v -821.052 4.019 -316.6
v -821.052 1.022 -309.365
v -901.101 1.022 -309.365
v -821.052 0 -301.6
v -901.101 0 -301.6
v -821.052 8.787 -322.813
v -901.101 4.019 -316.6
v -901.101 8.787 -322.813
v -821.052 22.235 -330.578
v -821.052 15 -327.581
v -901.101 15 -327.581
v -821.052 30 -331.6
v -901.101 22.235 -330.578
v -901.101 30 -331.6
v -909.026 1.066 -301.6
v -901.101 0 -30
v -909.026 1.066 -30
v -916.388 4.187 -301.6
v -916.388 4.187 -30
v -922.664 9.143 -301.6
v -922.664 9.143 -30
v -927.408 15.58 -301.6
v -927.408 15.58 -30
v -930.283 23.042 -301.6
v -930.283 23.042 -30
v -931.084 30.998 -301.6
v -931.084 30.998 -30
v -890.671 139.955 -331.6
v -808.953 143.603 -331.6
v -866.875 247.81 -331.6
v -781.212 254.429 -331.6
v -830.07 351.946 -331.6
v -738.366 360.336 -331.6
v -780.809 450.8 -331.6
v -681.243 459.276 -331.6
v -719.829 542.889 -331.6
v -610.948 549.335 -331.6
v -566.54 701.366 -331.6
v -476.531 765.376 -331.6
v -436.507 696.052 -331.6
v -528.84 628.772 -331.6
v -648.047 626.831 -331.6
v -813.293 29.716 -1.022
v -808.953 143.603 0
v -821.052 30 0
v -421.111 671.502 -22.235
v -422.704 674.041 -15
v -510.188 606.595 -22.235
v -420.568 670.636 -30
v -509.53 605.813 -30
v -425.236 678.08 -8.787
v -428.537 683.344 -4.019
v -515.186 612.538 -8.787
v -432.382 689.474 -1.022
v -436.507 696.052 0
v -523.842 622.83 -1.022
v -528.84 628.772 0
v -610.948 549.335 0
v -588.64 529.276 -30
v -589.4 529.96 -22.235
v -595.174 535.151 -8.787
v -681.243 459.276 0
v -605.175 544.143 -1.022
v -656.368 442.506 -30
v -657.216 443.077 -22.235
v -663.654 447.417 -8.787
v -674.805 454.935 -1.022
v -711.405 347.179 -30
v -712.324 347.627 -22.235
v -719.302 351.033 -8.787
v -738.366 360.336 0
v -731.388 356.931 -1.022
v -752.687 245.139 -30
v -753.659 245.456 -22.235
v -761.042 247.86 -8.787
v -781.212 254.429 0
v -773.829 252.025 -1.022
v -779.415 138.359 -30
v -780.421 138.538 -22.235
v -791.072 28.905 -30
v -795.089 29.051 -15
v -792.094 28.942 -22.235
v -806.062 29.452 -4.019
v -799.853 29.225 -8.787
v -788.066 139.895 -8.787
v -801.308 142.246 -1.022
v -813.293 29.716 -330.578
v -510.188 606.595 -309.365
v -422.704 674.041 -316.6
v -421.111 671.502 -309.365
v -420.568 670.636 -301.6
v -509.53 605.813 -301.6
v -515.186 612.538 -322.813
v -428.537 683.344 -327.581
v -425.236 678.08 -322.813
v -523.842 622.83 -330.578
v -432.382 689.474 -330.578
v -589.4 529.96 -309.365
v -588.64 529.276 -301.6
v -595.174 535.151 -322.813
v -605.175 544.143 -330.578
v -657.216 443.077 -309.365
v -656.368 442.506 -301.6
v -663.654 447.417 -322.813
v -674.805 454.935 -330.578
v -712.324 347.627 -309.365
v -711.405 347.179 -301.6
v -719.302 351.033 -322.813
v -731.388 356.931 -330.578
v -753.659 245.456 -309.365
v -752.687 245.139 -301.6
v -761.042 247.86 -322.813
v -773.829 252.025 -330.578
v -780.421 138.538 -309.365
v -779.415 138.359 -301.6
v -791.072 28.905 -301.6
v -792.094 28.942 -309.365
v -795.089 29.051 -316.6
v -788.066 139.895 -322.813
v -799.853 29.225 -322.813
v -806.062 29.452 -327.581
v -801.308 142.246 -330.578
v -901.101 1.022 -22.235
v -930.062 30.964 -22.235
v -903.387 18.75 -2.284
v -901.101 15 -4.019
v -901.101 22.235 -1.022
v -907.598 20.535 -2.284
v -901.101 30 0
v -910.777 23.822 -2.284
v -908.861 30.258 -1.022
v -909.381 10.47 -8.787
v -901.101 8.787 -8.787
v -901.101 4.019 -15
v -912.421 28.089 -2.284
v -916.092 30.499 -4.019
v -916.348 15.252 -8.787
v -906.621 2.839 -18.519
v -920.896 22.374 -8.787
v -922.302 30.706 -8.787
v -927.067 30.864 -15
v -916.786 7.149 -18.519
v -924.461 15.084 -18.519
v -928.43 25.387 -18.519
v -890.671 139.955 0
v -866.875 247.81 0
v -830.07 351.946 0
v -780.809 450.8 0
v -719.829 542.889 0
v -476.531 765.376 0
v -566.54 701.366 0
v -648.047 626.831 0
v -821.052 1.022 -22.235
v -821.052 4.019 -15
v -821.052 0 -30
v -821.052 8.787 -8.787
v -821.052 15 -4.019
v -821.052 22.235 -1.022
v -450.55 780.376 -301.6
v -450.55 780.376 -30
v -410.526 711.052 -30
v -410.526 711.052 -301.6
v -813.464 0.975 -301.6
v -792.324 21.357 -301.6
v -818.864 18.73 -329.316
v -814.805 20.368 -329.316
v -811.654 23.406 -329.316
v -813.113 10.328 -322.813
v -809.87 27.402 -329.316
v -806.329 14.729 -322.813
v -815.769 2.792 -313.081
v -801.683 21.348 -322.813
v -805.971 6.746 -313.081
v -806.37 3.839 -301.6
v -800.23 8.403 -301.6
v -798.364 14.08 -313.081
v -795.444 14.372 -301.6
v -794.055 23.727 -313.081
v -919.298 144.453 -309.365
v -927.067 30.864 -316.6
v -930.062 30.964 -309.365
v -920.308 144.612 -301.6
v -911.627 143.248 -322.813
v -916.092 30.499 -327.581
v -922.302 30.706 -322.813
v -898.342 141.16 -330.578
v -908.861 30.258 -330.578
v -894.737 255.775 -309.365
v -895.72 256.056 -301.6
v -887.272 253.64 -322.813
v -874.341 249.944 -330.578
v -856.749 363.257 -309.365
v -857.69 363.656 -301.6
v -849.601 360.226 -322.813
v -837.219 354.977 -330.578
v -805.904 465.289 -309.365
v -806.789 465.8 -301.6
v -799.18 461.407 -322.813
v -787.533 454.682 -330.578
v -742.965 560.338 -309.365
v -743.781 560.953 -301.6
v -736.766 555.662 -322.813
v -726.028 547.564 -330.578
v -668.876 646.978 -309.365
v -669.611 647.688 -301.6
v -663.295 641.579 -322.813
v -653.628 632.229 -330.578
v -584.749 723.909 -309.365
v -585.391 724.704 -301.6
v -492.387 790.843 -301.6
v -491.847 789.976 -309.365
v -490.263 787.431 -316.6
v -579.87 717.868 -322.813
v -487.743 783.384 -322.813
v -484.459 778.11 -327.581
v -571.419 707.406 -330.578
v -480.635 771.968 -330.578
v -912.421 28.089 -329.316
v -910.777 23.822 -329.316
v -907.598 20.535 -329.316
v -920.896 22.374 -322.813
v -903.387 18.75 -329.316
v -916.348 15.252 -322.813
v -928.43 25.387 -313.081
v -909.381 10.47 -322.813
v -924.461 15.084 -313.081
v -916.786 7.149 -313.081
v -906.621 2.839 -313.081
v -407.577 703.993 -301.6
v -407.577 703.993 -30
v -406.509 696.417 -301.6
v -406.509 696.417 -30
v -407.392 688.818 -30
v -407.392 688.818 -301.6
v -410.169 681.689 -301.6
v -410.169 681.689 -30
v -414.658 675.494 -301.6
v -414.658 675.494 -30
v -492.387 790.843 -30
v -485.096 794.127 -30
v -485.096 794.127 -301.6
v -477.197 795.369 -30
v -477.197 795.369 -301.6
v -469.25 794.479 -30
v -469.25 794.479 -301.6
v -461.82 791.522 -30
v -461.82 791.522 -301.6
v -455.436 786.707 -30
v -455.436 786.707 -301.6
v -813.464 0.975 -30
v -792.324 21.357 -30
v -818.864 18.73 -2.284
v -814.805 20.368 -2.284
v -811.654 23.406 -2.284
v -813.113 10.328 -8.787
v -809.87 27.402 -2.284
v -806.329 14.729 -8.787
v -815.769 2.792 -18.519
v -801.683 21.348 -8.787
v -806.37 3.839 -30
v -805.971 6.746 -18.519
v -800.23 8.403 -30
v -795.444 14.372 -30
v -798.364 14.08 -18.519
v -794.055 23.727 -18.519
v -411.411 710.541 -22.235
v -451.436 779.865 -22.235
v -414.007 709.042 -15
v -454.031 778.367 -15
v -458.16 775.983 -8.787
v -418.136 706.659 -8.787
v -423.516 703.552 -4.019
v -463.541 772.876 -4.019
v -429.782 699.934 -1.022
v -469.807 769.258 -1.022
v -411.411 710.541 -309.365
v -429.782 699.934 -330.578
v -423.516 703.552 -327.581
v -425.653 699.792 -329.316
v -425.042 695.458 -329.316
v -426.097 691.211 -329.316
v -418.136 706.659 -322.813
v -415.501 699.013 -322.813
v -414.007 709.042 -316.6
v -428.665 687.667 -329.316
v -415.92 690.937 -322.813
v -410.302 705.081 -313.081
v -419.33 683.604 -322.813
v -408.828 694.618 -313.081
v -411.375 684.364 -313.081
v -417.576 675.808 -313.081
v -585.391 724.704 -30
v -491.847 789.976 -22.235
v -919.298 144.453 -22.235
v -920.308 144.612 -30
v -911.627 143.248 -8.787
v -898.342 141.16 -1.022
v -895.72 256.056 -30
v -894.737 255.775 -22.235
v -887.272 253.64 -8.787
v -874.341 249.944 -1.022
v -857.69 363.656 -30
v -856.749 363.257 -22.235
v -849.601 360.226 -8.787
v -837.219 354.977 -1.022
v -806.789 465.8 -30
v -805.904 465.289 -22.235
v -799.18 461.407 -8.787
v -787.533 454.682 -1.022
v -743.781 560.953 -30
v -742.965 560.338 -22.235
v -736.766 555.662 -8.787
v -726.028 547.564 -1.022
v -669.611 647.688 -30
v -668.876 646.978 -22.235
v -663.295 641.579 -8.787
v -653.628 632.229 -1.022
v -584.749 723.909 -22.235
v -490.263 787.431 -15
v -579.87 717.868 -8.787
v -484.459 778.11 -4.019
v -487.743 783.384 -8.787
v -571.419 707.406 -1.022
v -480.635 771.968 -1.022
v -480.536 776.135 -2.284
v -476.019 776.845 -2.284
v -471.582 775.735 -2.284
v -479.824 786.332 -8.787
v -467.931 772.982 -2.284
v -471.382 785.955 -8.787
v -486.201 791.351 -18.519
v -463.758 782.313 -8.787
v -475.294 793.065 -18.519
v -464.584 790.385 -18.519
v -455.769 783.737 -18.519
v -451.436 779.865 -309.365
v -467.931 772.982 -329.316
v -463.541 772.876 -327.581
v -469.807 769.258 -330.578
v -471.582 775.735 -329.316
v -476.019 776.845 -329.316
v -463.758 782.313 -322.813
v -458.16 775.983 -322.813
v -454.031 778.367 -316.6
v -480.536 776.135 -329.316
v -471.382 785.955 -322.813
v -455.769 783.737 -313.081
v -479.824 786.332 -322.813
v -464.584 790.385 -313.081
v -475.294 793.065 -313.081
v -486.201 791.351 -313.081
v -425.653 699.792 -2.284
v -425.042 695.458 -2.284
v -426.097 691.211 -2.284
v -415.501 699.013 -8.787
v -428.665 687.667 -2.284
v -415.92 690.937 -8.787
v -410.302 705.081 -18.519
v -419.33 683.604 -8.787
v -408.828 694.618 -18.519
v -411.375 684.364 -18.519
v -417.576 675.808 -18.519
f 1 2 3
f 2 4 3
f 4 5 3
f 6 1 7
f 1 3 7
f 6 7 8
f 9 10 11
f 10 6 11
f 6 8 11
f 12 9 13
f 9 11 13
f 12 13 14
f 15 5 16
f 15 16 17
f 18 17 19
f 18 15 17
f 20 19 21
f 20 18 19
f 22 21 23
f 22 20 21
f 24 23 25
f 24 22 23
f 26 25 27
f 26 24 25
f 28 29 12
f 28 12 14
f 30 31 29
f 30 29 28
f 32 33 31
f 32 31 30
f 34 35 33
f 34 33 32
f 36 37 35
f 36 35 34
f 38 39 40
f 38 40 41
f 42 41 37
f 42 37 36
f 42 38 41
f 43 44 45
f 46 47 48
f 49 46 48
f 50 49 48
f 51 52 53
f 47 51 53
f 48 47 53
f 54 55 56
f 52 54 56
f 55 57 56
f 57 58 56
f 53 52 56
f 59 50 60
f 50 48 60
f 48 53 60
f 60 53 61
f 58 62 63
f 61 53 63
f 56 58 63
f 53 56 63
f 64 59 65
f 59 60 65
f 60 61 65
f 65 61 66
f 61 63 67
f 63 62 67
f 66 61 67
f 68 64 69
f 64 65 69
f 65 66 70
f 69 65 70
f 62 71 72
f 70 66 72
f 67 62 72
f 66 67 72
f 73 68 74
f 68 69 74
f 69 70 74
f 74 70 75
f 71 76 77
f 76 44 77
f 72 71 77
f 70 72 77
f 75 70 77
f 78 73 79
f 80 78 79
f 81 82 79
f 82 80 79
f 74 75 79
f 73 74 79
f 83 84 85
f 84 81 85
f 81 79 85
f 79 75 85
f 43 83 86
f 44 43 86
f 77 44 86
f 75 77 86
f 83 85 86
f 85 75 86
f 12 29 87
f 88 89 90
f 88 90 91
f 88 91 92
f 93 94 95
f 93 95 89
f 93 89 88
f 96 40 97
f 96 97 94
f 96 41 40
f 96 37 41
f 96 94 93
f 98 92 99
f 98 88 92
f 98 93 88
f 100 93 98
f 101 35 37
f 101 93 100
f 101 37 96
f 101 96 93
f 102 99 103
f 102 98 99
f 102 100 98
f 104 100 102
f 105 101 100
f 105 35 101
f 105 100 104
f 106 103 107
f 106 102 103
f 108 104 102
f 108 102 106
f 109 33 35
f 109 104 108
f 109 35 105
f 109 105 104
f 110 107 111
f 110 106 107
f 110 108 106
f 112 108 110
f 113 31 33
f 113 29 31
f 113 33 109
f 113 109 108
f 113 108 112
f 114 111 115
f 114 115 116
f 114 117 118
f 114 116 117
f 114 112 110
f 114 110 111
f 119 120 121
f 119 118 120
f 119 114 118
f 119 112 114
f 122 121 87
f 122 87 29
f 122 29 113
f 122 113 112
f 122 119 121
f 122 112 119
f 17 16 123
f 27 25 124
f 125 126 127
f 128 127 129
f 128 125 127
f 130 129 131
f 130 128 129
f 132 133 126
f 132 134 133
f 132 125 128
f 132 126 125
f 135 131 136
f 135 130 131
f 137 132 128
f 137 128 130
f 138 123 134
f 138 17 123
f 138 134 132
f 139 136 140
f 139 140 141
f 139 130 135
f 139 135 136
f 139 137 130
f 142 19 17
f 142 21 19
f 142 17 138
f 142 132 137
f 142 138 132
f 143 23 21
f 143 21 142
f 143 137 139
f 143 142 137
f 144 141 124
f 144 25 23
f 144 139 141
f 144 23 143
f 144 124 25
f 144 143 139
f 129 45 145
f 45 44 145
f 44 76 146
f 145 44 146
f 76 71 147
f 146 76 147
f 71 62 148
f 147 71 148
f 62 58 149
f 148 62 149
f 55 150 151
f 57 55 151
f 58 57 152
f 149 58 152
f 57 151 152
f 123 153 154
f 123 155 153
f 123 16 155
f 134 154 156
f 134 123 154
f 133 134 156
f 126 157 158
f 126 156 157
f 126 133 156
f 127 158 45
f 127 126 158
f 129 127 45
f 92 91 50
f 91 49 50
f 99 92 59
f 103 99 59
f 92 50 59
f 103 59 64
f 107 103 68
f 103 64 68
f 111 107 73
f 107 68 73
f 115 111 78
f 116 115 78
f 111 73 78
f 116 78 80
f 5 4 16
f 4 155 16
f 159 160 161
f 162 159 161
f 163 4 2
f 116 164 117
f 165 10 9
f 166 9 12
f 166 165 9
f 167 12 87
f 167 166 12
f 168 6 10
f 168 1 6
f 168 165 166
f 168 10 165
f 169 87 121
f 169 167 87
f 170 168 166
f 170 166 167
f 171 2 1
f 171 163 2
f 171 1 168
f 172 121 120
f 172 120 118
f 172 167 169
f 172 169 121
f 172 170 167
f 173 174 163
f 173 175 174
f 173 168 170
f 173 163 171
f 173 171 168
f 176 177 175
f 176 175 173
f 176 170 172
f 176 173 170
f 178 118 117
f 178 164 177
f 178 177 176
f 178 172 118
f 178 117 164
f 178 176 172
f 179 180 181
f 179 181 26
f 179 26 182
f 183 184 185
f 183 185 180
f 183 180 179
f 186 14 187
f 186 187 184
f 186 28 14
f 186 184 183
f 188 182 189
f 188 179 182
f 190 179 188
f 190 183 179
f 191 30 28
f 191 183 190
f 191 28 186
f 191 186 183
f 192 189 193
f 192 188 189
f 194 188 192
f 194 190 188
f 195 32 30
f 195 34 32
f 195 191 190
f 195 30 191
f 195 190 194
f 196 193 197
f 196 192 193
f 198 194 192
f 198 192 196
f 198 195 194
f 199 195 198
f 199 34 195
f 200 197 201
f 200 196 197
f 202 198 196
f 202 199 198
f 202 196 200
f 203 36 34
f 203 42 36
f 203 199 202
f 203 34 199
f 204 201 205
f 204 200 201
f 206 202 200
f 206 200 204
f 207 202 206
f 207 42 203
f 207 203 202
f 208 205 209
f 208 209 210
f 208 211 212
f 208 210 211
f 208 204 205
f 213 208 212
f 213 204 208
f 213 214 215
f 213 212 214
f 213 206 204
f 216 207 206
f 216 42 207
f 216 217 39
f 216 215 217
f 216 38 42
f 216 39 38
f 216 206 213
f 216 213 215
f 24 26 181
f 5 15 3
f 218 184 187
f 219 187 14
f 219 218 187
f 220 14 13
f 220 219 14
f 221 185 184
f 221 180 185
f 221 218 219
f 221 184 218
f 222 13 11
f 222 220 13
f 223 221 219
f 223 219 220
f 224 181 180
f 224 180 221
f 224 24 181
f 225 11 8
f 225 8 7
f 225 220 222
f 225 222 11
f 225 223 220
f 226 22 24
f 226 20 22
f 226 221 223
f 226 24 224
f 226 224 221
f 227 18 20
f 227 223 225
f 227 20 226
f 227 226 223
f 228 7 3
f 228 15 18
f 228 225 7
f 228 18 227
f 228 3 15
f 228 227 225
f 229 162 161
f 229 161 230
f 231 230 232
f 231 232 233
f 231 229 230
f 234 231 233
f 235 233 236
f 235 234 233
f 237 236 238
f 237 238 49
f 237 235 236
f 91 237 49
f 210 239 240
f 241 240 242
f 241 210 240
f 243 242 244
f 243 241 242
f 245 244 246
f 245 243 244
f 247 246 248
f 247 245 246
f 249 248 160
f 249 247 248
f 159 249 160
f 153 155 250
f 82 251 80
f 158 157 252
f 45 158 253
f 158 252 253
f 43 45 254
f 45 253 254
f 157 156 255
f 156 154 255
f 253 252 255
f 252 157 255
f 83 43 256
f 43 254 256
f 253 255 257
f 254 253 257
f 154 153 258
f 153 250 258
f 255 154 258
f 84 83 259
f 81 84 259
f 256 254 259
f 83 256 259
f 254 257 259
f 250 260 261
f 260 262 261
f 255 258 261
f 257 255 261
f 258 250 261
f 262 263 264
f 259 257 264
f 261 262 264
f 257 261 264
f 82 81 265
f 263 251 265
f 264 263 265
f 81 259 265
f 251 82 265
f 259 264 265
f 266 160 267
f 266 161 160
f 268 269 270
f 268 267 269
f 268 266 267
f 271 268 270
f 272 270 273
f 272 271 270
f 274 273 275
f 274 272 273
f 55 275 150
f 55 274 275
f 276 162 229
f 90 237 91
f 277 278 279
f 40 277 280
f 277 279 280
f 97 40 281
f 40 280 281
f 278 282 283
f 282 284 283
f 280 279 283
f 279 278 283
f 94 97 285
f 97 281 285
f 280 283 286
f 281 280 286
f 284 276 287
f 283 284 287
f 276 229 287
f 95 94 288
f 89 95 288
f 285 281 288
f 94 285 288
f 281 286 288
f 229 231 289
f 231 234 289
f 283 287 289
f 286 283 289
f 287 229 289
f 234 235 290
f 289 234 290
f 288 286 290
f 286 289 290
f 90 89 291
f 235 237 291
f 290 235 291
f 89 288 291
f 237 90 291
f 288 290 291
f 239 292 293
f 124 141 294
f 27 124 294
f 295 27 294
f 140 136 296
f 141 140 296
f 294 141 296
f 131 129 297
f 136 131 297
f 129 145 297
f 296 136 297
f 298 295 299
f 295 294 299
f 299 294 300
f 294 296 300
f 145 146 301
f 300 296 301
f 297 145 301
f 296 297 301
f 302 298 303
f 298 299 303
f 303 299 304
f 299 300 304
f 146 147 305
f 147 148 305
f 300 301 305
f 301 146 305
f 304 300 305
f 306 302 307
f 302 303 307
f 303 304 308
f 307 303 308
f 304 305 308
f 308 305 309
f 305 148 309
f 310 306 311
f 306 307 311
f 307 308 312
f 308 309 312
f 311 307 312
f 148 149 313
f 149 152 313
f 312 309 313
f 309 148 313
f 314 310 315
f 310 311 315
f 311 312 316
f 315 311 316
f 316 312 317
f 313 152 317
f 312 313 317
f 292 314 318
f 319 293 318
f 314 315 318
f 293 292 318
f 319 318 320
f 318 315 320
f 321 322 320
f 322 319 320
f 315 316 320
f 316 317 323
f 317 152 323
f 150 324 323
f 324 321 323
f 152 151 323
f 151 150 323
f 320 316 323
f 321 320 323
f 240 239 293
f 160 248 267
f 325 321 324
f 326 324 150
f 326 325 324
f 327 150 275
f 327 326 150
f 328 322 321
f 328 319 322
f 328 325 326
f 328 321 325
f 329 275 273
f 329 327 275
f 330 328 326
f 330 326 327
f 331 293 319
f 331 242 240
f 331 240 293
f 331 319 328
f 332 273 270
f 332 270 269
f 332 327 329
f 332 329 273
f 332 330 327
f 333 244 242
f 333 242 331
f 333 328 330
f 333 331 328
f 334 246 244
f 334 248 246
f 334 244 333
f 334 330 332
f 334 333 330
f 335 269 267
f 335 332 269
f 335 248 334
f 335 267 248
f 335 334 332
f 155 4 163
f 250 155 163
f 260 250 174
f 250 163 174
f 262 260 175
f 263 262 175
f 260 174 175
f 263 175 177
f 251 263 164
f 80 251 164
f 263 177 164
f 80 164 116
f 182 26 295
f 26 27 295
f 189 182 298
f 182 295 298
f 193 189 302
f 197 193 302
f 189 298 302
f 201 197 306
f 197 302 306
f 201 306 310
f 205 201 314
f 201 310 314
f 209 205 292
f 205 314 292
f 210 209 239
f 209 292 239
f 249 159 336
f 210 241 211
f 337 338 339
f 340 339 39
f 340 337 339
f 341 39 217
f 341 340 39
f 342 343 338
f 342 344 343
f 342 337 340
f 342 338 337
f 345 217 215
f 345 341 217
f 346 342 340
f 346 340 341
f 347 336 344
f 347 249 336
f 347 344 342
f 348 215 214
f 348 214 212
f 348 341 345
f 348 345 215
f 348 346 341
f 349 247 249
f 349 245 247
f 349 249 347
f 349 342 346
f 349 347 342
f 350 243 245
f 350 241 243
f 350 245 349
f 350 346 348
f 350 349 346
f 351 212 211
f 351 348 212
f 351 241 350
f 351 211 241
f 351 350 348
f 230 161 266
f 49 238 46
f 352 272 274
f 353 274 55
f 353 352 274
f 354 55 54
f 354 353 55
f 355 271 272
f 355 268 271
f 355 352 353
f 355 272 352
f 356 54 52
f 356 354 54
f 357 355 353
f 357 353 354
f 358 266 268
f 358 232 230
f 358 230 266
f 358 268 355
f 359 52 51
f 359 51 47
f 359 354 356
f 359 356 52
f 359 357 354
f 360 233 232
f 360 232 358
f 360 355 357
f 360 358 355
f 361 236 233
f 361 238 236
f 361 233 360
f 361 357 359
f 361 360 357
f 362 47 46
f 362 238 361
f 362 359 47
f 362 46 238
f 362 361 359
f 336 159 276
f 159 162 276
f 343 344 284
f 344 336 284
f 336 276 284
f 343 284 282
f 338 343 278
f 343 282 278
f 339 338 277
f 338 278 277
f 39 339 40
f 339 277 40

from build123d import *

# Parameters (mm, degrees)
BOSS_EXTRUDE1_DEPTH = 331.6
FILLET1_R           = 30


with BuildPart() as part:
    # Sketch1 → Boss-Extrude1 (new body)
    with BuildSketch(Plane.XY):
        with BuildLine():
            Line((-791.6, 0), (-931.6, 0))
            ThreePointArc((-931.6, 0), (-806.789266166, 465.8), (-465.8, 806.789266166))
            Line((-465.8, 806.789266166), (-395.8, 685.545709636))
            ThreePointArc((-395.8, 685.545709636), (-685.545709636, 395.8), (-791.6, 0))
        make_face()
    extrude(amount=-BOSS_EXTRUDE1_DEPTH)

    # Fillet1
    fillet1_edges = [part.edges().sort_by_distance(p)[0] for p in [
        (-806.789266166, 465.8, -331.6),
        (-861.6, 0, -331.6),
        (-685.545709636, 395.8, -331.6),
        (-861.6, 0, 0),
        (-806.789266166, 465.8, 0),
        (-430.8, 746.167487901, 0),
        (-685.545709636, 395.8, 0),
        (-791.6, 0, -165.8),
        (-931.6, 0, -165.8),
        (-465.8, 806.789266166, -165.8),
        (-395.8, 685.545709636, -165.8),
        (-430.8, 746.167487901, -331.6),
    ]]
    fillet(fillet1_edges, radius=FILLET1_R)


solid = part.part
